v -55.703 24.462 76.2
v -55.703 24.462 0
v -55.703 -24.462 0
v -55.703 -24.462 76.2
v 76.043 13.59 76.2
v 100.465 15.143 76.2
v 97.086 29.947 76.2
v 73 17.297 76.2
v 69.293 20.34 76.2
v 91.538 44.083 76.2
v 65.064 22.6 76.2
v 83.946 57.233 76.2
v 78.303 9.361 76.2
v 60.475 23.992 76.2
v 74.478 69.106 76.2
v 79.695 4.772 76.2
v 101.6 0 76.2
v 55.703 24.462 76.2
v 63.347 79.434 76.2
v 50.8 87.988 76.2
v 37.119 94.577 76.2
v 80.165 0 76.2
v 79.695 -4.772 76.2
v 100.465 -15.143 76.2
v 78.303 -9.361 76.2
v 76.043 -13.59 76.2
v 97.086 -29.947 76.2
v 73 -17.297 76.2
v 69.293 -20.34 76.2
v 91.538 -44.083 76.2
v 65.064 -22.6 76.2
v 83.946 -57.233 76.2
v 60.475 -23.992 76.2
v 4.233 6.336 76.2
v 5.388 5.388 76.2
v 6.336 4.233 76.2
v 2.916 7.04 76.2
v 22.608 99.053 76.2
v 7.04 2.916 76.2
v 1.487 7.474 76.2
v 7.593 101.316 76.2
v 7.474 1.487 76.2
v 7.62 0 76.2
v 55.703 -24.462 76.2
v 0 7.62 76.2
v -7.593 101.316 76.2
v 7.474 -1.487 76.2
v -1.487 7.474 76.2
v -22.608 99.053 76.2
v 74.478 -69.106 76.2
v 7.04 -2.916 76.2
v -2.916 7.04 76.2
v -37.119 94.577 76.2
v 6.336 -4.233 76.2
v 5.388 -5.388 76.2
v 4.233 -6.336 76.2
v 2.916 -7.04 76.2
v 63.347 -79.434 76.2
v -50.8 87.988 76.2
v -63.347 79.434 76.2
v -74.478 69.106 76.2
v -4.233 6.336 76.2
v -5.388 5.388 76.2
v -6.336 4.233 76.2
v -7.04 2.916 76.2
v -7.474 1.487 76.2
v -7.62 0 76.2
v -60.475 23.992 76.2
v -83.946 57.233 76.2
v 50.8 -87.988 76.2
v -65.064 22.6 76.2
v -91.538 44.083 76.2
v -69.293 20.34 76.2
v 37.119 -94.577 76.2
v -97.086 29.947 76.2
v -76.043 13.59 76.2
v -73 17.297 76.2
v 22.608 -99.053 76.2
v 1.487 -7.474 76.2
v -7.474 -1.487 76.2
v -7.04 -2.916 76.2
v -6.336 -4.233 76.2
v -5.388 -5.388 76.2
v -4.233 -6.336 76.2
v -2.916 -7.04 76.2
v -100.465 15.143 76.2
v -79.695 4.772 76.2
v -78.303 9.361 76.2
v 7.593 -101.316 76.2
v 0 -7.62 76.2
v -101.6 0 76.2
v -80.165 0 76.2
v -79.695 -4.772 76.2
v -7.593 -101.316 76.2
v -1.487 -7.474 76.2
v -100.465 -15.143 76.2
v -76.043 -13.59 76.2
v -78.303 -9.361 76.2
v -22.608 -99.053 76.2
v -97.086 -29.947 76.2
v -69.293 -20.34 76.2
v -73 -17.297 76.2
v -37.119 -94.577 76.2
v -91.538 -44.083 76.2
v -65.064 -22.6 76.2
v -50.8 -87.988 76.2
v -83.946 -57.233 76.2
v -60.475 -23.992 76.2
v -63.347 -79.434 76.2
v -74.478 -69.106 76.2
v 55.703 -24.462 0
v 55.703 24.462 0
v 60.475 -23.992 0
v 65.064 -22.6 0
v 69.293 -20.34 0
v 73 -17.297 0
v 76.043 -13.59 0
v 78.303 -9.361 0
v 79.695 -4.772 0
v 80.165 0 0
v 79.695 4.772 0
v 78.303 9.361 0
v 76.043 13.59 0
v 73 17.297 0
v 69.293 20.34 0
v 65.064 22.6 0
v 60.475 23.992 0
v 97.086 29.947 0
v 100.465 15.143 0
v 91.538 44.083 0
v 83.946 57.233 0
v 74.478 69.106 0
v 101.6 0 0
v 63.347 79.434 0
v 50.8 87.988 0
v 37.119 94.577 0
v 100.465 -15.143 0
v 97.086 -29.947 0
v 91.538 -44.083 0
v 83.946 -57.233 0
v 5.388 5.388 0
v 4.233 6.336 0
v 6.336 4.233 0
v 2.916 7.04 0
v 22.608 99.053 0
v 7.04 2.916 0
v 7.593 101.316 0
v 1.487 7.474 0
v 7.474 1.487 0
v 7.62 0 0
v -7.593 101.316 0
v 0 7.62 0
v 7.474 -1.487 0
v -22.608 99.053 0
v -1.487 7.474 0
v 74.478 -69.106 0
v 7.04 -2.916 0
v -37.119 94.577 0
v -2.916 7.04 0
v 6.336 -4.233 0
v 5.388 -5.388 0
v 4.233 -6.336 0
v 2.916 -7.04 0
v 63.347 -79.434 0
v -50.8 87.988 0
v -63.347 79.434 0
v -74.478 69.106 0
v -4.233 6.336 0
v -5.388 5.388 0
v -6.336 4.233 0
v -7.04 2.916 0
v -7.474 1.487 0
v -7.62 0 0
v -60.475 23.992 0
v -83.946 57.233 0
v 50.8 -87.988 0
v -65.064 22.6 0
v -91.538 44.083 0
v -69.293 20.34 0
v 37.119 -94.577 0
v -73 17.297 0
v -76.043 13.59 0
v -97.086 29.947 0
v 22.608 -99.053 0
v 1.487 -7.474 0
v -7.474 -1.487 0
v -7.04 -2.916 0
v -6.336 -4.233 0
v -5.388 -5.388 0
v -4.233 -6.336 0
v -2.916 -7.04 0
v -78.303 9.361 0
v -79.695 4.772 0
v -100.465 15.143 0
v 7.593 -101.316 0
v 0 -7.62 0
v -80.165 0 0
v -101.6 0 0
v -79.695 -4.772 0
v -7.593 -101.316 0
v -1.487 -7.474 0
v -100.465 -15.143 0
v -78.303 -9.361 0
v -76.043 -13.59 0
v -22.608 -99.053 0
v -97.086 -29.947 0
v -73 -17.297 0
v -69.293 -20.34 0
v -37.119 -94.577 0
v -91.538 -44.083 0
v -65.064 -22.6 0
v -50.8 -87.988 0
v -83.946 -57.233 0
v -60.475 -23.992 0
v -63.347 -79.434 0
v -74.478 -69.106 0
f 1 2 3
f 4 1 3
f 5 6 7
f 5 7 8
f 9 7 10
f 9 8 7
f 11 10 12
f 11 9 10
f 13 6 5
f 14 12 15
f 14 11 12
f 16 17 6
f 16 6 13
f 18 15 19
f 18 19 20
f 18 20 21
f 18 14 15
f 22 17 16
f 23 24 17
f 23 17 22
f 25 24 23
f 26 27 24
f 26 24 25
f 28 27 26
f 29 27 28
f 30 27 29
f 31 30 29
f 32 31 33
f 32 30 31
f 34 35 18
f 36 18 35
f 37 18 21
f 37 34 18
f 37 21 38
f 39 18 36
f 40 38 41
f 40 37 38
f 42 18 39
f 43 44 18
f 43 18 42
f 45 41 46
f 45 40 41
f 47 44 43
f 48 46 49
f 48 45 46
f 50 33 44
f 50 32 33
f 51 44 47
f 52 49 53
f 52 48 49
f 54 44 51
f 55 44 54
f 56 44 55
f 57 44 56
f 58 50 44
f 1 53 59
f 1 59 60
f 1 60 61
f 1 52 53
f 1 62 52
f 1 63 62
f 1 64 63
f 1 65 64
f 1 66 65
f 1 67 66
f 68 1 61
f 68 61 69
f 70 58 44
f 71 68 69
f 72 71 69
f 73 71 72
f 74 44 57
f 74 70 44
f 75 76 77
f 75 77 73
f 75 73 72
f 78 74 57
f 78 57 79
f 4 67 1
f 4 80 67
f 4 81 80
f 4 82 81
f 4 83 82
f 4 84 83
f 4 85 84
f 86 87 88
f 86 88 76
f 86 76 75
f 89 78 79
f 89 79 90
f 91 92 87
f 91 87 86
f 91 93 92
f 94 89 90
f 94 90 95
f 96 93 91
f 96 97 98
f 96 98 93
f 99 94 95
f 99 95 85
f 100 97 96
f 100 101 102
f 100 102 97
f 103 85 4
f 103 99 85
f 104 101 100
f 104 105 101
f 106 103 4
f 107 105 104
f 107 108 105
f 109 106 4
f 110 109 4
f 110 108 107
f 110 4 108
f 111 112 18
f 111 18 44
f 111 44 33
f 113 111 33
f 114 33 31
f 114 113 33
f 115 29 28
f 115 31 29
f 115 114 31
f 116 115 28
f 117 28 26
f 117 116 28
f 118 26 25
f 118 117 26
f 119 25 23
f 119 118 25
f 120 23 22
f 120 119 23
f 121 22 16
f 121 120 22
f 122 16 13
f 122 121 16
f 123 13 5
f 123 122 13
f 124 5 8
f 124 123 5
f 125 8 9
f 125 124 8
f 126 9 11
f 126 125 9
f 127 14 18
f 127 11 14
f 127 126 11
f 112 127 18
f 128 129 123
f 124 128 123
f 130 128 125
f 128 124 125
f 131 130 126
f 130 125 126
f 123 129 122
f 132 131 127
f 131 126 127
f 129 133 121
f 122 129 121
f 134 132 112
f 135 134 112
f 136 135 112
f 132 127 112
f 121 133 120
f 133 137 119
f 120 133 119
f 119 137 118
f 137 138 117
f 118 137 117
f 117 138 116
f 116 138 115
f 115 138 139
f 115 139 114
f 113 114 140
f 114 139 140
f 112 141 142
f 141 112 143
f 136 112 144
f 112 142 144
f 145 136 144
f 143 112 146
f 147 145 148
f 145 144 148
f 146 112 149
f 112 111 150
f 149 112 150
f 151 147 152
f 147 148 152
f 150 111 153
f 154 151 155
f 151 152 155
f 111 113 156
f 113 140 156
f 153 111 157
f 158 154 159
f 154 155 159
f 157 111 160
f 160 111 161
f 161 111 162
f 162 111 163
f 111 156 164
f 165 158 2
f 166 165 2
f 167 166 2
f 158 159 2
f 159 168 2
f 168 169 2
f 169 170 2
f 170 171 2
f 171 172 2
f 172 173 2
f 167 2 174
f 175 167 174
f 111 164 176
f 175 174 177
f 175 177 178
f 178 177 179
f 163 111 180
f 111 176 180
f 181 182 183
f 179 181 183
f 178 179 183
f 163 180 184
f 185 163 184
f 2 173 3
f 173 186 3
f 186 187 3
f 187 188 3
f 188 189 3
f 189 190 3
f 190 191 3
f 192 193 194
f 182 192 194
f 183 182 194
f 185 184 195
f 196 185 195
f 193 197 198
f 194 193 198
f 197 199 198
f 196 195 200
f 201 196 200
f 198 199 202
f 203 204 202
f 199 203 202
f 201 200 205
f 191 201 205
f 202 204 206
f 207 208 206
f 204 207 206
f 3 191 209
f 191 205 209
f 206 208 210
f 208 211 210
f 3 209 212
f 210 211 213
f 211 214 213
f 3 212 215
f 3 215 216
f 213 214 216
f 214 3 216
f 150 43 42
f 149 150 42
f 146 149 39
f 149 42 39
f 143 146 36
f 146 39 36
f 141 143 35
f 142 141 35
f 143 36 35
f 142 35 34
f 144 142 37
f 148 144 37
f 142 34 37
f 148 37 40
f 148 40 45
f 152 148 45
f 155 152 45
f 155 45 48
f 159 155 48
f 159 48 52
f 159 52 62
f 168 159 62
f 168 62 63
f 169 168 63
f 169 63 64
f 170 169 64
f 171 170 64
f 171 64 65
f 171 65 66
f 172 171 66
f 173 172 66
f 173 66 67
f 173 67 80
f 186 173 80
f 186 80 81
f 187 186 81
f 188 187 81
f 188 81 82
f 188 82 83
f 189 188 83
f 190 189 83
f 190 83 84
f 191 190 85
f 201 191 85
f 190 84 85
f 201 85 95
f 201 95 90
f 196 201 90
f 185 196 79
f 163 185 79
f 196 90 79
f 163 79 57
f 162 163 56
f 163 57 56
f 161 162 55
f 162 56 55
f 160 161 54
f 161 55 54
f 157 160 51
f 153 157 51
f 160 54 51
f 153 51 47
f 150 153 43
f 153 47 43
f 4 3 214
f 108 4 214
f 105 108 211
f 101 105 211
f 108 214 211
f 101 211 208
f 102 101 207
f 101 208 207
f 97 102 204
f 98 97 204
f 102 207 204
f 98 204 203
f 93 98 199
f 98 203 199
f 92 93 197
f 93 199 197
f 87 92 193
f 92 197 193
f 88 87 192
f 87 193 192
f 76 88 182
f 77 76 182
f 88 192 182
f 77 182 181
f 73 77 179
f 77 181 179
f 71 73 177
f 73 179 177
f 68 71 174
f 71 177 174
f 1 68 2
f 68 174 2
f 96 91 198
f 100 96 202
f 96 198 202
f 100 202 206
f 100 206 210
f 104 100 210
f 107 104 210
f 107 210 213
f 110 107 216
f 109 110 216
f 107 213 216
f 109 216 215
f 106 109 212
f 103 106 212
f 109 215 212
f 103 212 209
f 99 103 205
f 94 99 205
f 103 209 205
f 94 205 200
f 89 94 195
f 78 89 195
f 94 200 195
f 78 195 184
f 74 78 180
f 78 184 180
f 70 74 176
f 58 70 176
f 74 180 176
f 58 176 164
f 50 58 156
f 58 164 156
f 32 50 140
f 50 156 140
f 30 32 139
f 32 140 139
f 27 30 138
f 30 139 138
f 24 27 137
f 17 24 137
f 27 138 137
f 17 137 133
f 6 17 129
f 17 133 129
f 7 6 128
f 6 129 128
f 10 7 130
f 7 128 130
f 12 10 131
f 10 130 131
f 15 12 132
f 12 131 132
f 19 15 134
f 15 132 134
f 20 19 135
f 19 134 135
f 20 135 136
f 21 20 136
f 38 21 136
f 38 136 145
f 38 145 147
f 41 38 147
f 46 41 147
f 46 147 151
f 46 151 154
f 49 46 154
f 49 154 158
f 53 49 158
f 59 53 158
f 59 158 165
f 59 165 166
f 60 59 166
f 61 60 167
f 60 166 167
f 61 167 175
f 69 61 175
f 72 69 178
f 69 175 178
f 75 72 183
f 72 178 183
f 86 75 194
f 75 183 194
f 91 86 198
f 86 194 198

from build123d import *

# Parameters (mm, degrees)
SKETCH1_R               = 101.6
BOSS_EXTRUDE1_DEPTH     = 76.2
CUT_EXTRUDE7_DEPTH      = 163.639355631
CUT_EXTRUDE7_DEPTH_BACK = 163.639355631
SKETCH3_R               = 7.62
CUT_EXTRUDE8_DEPTH      = 163.639355631


with BuildPart() as part:
    # Sketch1 → Boss-Extrude1 (new body)
    with BuildSketch(Plane.XY):
        with Locations(Location((0, 0, 0), (0, 0, 180))):
            Circle(SKETCH1_R)
    extrude(amount=BOSS_EXTRUDE1_DEPTH)

    # Sketch2 → Cut-Extrude7 (cut, two sides: drawn at the far end of the back side and taken through both)
    with BuildSketch(Plane.XY.offset(76.2).offset(-CUT_EXTRUDE7_DEPTH_BACK)):
        with BuildLine():
            ThreePointArc((-55.703026842, -24.462175809), (-80.165202651, 0), (-55.703026842, 24.462175809))
            Line((-55.703026842, 24.462175809), (-55.703026842, -24.462175809))
        make_face()
        with BuildLine():
            Line((55.703026842, 24.462175809), (55.703026842, -24.462175809))
            ThreePointArc((55.703026842, -24.462175809), (80.165202651, 0), (55.703026842, 24.462175809))
        make_face()
    extrude(amount=CUT_EXTRUDE7_DEPTH + CUT_EXTRUDE7_DEPTH_BACK, mode=Mode.SUBTRACT)

    # Sketch3 → Cut-Extrude8 (cut, through all)
    with BuildSketch(Plane.XY.offset(76.2)):
        Circle(SKETCH3_R)
    extrude(amount=-CUT_EXTRUDE8_DEPTH, mode=Mode.SUBTRACT)


solid = part.part
